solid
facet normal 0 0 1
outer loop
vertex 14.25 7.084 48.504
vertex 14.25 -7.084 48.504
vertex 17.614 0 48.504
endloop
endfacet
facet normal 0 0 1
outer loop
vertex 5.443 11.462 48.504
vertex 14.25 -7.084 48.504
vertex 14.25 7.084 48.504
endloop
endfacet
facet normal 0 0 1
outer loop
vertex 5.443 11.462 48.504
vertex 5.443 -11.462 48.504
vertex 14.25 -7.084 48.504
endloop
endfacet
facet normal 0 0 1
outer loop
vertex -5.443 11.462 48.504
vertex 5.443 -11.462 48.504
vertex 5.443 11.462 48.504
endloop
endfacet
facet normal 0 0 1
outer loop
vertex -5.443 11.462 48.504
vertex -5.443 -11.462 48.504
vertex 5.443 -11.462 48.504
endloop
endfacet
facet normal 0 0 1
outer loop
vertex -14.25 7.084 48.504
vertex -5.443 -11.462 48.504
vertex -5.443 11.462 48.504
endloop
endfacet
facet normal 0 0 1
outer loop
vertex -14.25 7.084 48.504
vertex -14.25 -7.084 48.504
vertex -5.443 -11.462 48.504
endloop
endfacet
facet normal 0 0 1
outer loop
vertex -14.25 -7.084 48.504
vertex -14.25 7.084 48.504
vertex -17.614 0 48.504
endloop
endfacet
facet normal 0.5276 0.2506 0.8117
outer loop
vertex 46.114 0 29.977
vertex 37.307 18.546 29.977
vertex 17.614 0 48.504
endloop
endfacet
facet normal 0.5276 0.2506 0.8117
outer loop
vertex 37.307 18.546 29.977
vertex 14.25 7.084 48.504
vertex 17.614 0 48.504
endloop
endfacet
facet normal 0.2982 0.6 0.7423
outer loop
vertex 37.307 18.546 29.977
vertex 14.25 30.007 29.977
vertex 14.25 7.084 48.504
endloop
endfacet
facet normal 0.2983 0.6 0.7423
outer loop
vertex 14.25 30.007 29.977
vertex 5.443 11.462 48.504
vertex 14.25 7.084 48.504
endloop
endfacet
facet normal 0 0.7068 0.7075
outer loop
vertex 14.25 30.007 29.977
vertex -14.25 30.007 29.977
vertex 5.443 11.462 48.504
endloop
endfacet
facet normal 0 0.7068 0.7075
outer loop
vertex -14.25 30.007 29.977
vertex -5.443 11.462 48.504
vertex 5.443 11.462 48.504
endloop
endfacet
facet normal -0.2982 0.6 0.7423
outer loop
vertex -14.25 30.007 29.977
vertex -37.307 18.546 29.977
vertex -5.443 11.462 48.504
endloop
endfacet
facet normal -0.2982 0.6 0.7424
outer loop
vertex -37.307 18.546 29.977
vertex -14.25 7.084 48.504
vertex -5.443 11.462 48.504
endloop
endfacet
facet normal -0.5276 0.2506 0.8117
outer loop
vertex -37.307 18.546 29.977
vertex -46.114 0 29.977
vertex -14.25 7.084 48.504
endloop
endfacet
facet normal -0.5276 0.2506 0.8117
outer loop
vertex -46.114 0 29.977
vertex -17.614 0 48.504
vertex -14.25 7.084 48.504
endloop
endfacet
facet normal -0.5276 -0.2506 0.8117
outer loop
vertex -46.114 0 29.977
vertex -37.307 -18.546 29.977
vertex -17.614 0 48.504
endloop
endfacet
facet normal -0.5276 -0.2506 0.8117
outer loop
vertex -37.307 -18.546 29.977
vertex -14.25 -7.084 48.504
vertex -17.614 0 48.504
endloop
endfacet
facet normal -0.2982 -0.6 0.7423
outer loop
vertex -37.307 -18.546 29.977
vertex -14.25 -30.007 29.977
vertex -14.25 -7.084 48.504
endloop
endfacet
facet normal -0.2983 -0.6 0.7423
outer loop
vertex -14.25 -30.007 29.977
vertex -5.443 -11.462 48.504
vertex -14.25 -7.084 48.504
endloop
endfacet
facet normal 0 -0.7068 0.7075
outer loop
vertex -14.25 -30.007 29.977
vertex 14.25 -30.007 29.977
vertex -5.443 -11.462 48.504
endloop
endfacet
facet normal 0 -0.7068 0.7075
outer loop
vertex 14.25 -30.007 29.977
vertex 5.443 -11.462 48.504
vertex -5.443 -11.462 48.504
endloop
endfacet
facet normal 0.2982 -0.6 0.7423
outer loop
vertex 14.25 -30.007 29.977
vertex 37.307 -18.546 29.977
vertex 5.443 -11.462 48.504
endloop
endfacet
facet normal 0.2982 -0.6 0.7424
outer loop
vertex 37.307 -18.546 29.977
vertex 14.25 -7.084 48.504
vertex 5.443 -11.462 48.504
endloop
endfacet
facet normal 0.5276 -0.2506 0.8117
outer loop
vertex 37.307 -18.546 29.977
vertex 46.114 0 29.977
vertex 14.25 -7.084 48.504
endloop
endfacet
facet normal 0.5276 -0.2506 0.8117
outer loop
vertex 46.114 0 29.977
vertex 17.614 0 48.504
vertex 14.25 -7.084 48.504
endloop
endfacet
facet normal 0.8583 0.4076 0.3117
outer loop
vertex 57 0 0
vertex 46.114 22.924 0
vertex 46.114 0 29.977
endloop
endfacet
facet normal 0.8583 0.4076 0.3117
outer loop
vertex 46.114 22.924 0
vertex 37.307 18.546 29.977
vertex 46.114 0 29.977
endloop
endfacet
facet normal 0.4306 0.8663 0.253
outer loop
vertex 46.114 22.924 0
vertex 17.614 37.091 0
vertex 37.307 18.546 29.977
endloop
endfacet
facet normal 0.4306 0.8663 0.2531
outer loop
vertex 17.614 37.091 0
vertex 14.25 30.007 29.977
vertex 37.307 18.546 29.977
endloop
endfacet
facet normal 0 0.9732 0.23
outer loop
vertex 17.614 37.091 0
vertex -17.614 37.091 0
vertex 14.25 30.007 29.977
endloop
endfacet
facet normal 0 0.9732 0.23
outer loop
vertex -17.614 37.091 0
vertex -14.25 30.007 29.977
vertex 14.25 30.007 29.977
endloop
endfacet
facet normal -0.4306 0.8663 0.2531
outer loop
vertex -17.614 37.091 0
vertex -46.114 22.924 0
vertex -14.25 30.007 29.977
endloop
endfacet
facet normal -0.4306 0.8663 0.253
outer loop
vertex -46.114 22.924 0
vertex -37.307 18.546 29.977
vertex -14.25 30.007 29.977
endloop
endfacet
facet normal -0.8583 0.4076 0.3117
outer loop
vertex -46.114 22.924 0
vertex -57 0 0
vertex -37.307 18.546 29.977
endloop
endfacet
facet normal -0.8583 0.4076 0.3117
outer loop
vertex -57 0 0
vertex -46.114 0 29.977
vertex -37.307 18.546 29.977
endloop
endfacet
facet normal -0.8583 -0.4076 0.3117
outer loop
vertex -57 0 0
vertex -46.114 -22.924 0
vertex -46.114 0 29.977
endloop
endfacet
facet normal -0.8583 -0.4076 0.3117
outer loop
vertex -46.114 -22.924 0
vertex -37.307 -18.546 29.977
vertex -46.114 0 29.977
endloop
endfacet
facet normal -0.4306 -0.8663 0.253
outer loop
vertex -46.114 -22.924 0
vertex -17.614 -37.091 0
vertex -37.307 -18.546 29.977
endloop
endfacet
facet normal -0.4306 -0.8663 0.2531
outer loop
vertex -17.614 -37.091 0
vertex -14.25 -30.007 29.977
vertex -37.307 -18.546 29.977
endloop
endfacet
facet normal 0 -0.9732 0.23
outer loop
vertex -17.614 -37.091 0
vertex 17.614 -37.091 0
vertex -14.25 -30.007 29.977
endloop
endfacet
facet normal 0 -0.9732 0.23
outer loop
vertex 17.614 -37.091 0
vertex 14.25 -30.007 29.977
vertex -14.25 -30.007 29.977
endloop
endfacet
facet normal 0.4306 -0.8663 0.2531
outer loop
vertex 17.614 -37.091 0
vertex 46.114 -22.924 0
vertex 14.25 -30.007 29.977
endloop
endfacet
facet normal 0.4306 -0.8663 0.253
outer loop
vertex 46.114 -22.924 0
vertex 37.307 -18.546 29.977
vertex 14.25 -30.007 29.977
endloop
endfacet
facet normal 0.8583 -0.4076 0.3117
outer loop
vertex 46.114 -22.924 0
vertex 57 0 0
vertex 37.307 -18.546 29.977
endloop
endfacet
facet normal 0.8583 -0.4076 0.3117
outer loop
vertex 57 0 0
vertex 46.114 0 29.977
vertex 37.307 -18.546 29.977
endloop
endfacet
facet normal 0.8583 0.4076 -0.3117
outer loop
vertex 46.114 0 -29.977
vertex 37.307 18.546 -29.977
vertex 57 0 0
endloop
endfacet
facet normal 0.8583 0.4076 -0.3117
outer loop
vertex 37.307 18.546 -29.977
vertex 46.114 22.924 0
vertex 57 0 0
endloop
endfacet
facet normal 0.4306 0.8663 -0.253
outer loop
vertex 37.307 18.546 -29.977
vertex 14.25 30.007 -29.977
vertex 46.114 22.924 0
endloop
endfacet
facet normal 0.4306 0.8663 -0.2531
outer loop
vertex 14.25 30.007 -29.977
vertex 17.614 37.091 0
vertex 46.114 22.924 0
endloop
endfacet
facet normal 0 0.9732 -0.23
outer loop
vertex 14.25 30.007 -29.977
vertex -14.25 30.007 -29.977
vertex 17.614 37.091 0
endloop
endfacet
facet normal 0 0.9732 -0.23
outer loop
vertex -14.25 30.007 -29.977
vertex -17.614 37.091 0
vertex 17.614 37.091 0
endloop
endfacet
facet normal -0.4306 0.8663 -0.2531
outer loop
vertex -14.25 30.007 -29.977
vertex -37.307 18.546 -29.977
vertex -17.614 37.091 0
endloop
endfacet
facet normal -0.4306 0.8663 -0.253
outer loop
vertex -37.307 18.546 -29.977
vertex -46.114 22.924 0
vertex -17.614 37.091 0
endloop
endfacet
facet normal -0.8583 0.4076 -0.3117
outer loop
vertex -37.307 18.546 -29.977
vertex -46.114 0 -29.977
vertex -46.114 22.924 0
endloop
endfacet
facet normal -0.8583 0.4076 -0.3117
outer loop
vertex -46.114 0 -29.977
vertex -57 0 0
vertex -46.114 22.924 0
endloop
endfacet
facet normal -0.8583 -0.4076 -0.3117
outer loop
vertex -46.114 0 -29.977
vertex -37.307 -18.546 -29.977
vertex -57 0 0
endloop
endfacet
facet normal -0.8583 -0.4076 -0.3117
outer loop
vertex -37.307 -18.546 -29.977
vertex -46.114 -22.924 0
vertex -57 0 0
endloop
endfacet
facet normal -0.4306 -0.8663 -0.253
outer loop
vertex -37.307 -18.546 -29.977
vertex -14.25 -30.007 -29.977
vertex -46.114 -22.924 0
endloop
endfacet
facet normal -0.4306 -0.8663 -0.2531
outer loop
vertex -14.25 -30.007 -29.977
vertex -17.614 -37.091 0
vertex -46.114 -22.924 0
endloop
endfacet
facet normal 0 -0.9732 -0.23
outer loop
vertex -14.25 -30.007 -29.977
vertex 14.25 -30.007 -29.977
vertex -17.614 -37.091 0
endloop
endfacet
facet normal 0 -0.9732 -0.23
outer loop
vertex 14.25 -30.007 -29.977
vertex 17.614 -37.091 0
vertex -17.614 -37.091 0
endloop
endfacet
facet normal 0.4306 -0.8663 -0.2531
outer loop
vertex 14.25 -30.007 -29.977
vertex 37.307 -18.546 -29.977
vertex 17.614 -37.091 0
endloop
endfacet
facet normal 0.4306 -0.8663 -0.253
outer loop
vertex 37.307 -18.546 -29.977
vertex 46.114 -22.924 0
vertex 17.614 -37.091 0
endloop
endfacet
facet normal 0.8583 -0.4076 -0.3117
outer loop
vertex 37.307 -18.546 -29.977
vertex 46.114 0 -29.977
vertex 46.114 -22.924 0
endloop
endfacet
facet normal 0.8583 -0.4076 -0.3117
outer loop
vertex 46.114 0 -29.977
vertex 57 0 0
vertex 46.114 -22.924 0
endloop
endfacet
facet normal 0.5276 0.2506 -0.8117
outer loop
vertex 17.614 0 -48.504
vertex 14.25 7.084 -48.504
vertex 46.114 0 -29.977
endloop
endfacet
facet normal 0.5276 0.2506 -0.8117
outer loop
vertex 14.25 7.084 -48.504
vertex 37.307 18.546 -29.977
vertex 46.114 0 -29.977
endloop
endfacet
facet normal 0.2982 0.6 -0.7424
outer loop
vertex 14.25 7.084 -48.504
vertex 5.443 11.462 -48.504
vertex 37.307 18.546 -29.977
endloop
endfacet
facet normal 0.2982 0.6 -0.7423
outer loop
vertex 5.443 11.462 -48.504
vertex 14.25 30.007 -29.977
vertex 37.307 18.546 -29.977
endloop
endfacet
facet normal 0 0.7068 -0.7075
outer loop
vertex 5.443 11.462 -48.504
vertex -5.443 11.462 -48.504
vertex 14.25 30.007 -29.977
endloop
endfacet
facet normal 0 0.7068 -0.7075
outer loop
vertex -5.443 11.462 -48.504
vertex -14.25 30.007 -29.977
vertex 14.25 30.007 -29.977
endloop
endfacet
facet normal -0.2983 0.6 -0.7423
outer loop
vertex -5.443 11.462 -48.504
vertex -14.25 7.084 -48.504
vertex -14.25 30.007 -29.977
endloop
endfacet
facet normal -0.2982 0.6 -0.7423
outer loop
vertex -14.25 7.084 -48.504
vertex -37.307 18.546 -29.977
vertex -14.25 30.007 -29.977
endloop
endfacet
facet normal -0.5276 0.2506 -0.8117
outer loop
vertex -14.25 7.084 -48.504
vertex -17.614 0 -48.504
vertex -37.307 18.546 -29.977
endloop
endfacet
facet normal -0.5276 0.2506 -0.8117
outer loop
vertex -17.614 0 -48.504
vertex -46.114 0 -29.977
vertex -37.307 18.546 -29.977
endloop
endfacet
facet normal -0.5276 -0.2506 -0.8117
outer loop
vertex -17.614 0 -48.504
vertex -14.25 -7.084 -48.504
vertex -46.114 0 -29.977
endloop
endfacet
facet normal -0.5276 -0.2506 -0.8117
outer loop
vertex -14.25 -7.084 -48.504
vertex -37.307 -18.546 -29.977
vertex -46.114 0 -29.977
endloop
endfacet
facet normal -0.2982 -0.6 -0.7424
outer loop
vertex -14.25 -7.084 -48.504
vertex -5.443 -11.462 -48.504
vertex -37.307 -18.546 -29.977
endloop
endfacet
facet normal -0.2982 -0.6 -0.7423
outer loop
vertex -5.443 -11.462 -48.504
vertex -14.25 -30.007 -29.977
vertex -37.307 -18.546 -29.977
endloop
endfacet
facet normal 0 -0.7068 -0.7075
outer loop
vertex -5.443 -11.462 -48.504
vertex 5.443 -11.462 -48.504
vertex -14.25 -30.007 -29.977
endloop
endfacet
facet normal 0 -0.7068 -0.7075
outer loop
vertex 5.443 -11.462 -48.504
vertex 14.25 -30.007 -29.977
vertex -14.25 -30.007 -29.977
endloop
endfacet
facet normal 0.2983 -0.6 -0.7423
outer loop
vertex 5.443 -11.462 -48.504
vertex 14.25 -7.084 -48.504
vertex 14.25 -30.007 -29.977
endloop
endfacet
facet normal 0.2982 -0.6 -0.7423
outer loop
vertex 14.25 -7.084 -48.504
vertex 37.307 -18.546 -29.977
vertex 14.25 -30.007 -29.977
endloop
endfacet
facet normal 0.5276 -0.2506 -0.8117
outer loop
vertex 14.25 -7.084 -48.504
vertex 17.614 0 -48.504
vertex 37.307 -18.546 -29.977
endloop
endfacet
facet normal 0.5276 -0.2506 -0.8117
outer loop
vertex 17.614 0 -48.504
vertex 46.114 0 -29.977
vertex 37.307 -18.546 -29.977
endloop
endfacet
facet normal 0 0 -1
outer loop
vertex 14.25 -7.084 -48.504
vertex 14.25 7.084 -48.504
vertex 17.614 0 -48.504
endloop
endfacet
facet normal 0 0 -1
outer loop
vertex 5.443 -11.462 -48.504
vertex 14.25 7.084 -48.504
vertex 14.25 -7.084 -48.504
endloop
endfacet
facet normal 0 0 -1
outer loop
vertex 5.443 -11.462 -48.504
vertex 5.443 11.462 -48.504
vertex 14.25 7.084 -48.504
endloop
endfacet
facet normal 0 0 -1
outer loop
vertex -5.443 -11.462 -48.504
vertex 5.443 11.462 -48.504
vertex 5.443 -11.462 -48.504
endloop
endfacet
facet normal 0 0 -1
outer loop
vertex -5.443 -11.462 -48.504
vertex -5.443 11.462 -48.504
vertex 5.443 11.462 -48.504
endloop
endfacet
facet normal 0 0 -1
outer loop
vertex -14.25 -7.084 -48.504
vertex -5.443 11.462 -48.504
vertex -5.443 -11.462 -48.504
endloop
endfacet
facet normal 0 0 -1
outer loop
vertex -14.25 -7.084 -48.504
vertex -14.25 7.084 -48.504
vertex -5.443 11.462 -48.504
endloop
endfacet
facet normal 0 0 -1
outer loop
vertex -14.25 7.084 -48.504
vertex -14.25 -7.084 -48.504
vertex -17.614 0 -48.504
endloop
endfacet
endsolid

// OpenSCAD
// Generated by SolidPython 1.0.1 on 2020-07-29 00:46:54


scale(v = [19, 13, 17]) {
	sphere(r = 3);
}
/***********************************************
*********      SolidPython code:      **********
************************************************
 
# import packages: SolidPython
from solid import *
from solid.utils import *
from itertools import chain, combinations, permutations


class Resize:

    def __init__(self, scad_file):
        self.scad_file = scad_file
        #self.scad_file = import_scad(scad_file)
        # cone/cylinder param:
        self.r1 = 0
        self.r2 = 0
        self.h = 0
        # rectangular prism param:
        self.w = 0
        self.l = 0
        # ellipse param:
        self.r = 0

    # import OpenScad code (file name corresponds to shape)


    # classify shape + parameters
    def assign(self, param1, param2, param3):
        if self.scad_file == 'cone.scad':
            self.r1 = param1
            self.r2 = param2
            self.h = param3
        elif self.scad_file == 'cylinder.scad':
            self.r1 = param1
            self.r2 = param2
            self.h = param3
        elif self.scad_file == 'rectangularPrism.scad':
            self.h = param1
            self.l = param2
            self.w = param3
        else:
            self.r = param1
            self.h = param2

    # resize parameters
    def iterate(self):
        x = range(3, 20, 2)
        i = 1
        if self.scad_file == 'cone.scad':
            tempList = list(permutations(x, 2))
            for temp in tempList:
                param1 = temp[0]
                param2 = temp[1]
                filepath = 'produced_scad_files/' + 'cone' + str(param1) + '_' + str(param2) + '_' + '.scad'
                scad_render_to_file(cylinder(h=param1, r1=param2, r2=0), filepath)

        elif self.scad_file == 'cylinder.scad':
            tempList = list(permutations(x, 3))
            for temp in tempList:
                param1 = temp[0]
                param2 = temp[1]
                filepath = 'produced_scad_files/' + 'cylinder' + str(param1) + '_' + str(param2) + '_' + '.scad'
                scad_render_to_file(cylinder(h=param1, r1=param2, r2=param2), filepath)

        elif self.scad_file == 'rectangularPrism.scad':
            tempList = list(permutations(x, 3))
            for temp in tempList:
                param1 = temp[0]
                param2 = temp[1]
                param3 = temp[2]
                filepath = 'produced_scad_files/' + 'rectangularPrism' + str(param1) + '_' + str(param2) + '_' + str(
                    param3) + '.scad'
                scad_render_to_file(cube(size=(param1, param2, param3)), filepath)

        elif self.scad_file == 'ellipse.scad':
            tempList = list(permutations(x, 4))
            for temp in tempList:
                param1 = temp[0]
                param2 = temp[1]
                param3 = temp[2]
                param4 = temp[3]
                filepath = 'produced_scad_files/' + 'ellipse' + str(param1) + '_' + str(param2) + '_' + str(param3) + '_' + str(param4) + '.scad'
                scad_render_to_file(scale([param1, param2, param3])(sphere(r=param4)), filepath)

    def render_to_scadfile(self):
        scad_render_to_file(scad, 'example.scad') 
 
************************************************/
